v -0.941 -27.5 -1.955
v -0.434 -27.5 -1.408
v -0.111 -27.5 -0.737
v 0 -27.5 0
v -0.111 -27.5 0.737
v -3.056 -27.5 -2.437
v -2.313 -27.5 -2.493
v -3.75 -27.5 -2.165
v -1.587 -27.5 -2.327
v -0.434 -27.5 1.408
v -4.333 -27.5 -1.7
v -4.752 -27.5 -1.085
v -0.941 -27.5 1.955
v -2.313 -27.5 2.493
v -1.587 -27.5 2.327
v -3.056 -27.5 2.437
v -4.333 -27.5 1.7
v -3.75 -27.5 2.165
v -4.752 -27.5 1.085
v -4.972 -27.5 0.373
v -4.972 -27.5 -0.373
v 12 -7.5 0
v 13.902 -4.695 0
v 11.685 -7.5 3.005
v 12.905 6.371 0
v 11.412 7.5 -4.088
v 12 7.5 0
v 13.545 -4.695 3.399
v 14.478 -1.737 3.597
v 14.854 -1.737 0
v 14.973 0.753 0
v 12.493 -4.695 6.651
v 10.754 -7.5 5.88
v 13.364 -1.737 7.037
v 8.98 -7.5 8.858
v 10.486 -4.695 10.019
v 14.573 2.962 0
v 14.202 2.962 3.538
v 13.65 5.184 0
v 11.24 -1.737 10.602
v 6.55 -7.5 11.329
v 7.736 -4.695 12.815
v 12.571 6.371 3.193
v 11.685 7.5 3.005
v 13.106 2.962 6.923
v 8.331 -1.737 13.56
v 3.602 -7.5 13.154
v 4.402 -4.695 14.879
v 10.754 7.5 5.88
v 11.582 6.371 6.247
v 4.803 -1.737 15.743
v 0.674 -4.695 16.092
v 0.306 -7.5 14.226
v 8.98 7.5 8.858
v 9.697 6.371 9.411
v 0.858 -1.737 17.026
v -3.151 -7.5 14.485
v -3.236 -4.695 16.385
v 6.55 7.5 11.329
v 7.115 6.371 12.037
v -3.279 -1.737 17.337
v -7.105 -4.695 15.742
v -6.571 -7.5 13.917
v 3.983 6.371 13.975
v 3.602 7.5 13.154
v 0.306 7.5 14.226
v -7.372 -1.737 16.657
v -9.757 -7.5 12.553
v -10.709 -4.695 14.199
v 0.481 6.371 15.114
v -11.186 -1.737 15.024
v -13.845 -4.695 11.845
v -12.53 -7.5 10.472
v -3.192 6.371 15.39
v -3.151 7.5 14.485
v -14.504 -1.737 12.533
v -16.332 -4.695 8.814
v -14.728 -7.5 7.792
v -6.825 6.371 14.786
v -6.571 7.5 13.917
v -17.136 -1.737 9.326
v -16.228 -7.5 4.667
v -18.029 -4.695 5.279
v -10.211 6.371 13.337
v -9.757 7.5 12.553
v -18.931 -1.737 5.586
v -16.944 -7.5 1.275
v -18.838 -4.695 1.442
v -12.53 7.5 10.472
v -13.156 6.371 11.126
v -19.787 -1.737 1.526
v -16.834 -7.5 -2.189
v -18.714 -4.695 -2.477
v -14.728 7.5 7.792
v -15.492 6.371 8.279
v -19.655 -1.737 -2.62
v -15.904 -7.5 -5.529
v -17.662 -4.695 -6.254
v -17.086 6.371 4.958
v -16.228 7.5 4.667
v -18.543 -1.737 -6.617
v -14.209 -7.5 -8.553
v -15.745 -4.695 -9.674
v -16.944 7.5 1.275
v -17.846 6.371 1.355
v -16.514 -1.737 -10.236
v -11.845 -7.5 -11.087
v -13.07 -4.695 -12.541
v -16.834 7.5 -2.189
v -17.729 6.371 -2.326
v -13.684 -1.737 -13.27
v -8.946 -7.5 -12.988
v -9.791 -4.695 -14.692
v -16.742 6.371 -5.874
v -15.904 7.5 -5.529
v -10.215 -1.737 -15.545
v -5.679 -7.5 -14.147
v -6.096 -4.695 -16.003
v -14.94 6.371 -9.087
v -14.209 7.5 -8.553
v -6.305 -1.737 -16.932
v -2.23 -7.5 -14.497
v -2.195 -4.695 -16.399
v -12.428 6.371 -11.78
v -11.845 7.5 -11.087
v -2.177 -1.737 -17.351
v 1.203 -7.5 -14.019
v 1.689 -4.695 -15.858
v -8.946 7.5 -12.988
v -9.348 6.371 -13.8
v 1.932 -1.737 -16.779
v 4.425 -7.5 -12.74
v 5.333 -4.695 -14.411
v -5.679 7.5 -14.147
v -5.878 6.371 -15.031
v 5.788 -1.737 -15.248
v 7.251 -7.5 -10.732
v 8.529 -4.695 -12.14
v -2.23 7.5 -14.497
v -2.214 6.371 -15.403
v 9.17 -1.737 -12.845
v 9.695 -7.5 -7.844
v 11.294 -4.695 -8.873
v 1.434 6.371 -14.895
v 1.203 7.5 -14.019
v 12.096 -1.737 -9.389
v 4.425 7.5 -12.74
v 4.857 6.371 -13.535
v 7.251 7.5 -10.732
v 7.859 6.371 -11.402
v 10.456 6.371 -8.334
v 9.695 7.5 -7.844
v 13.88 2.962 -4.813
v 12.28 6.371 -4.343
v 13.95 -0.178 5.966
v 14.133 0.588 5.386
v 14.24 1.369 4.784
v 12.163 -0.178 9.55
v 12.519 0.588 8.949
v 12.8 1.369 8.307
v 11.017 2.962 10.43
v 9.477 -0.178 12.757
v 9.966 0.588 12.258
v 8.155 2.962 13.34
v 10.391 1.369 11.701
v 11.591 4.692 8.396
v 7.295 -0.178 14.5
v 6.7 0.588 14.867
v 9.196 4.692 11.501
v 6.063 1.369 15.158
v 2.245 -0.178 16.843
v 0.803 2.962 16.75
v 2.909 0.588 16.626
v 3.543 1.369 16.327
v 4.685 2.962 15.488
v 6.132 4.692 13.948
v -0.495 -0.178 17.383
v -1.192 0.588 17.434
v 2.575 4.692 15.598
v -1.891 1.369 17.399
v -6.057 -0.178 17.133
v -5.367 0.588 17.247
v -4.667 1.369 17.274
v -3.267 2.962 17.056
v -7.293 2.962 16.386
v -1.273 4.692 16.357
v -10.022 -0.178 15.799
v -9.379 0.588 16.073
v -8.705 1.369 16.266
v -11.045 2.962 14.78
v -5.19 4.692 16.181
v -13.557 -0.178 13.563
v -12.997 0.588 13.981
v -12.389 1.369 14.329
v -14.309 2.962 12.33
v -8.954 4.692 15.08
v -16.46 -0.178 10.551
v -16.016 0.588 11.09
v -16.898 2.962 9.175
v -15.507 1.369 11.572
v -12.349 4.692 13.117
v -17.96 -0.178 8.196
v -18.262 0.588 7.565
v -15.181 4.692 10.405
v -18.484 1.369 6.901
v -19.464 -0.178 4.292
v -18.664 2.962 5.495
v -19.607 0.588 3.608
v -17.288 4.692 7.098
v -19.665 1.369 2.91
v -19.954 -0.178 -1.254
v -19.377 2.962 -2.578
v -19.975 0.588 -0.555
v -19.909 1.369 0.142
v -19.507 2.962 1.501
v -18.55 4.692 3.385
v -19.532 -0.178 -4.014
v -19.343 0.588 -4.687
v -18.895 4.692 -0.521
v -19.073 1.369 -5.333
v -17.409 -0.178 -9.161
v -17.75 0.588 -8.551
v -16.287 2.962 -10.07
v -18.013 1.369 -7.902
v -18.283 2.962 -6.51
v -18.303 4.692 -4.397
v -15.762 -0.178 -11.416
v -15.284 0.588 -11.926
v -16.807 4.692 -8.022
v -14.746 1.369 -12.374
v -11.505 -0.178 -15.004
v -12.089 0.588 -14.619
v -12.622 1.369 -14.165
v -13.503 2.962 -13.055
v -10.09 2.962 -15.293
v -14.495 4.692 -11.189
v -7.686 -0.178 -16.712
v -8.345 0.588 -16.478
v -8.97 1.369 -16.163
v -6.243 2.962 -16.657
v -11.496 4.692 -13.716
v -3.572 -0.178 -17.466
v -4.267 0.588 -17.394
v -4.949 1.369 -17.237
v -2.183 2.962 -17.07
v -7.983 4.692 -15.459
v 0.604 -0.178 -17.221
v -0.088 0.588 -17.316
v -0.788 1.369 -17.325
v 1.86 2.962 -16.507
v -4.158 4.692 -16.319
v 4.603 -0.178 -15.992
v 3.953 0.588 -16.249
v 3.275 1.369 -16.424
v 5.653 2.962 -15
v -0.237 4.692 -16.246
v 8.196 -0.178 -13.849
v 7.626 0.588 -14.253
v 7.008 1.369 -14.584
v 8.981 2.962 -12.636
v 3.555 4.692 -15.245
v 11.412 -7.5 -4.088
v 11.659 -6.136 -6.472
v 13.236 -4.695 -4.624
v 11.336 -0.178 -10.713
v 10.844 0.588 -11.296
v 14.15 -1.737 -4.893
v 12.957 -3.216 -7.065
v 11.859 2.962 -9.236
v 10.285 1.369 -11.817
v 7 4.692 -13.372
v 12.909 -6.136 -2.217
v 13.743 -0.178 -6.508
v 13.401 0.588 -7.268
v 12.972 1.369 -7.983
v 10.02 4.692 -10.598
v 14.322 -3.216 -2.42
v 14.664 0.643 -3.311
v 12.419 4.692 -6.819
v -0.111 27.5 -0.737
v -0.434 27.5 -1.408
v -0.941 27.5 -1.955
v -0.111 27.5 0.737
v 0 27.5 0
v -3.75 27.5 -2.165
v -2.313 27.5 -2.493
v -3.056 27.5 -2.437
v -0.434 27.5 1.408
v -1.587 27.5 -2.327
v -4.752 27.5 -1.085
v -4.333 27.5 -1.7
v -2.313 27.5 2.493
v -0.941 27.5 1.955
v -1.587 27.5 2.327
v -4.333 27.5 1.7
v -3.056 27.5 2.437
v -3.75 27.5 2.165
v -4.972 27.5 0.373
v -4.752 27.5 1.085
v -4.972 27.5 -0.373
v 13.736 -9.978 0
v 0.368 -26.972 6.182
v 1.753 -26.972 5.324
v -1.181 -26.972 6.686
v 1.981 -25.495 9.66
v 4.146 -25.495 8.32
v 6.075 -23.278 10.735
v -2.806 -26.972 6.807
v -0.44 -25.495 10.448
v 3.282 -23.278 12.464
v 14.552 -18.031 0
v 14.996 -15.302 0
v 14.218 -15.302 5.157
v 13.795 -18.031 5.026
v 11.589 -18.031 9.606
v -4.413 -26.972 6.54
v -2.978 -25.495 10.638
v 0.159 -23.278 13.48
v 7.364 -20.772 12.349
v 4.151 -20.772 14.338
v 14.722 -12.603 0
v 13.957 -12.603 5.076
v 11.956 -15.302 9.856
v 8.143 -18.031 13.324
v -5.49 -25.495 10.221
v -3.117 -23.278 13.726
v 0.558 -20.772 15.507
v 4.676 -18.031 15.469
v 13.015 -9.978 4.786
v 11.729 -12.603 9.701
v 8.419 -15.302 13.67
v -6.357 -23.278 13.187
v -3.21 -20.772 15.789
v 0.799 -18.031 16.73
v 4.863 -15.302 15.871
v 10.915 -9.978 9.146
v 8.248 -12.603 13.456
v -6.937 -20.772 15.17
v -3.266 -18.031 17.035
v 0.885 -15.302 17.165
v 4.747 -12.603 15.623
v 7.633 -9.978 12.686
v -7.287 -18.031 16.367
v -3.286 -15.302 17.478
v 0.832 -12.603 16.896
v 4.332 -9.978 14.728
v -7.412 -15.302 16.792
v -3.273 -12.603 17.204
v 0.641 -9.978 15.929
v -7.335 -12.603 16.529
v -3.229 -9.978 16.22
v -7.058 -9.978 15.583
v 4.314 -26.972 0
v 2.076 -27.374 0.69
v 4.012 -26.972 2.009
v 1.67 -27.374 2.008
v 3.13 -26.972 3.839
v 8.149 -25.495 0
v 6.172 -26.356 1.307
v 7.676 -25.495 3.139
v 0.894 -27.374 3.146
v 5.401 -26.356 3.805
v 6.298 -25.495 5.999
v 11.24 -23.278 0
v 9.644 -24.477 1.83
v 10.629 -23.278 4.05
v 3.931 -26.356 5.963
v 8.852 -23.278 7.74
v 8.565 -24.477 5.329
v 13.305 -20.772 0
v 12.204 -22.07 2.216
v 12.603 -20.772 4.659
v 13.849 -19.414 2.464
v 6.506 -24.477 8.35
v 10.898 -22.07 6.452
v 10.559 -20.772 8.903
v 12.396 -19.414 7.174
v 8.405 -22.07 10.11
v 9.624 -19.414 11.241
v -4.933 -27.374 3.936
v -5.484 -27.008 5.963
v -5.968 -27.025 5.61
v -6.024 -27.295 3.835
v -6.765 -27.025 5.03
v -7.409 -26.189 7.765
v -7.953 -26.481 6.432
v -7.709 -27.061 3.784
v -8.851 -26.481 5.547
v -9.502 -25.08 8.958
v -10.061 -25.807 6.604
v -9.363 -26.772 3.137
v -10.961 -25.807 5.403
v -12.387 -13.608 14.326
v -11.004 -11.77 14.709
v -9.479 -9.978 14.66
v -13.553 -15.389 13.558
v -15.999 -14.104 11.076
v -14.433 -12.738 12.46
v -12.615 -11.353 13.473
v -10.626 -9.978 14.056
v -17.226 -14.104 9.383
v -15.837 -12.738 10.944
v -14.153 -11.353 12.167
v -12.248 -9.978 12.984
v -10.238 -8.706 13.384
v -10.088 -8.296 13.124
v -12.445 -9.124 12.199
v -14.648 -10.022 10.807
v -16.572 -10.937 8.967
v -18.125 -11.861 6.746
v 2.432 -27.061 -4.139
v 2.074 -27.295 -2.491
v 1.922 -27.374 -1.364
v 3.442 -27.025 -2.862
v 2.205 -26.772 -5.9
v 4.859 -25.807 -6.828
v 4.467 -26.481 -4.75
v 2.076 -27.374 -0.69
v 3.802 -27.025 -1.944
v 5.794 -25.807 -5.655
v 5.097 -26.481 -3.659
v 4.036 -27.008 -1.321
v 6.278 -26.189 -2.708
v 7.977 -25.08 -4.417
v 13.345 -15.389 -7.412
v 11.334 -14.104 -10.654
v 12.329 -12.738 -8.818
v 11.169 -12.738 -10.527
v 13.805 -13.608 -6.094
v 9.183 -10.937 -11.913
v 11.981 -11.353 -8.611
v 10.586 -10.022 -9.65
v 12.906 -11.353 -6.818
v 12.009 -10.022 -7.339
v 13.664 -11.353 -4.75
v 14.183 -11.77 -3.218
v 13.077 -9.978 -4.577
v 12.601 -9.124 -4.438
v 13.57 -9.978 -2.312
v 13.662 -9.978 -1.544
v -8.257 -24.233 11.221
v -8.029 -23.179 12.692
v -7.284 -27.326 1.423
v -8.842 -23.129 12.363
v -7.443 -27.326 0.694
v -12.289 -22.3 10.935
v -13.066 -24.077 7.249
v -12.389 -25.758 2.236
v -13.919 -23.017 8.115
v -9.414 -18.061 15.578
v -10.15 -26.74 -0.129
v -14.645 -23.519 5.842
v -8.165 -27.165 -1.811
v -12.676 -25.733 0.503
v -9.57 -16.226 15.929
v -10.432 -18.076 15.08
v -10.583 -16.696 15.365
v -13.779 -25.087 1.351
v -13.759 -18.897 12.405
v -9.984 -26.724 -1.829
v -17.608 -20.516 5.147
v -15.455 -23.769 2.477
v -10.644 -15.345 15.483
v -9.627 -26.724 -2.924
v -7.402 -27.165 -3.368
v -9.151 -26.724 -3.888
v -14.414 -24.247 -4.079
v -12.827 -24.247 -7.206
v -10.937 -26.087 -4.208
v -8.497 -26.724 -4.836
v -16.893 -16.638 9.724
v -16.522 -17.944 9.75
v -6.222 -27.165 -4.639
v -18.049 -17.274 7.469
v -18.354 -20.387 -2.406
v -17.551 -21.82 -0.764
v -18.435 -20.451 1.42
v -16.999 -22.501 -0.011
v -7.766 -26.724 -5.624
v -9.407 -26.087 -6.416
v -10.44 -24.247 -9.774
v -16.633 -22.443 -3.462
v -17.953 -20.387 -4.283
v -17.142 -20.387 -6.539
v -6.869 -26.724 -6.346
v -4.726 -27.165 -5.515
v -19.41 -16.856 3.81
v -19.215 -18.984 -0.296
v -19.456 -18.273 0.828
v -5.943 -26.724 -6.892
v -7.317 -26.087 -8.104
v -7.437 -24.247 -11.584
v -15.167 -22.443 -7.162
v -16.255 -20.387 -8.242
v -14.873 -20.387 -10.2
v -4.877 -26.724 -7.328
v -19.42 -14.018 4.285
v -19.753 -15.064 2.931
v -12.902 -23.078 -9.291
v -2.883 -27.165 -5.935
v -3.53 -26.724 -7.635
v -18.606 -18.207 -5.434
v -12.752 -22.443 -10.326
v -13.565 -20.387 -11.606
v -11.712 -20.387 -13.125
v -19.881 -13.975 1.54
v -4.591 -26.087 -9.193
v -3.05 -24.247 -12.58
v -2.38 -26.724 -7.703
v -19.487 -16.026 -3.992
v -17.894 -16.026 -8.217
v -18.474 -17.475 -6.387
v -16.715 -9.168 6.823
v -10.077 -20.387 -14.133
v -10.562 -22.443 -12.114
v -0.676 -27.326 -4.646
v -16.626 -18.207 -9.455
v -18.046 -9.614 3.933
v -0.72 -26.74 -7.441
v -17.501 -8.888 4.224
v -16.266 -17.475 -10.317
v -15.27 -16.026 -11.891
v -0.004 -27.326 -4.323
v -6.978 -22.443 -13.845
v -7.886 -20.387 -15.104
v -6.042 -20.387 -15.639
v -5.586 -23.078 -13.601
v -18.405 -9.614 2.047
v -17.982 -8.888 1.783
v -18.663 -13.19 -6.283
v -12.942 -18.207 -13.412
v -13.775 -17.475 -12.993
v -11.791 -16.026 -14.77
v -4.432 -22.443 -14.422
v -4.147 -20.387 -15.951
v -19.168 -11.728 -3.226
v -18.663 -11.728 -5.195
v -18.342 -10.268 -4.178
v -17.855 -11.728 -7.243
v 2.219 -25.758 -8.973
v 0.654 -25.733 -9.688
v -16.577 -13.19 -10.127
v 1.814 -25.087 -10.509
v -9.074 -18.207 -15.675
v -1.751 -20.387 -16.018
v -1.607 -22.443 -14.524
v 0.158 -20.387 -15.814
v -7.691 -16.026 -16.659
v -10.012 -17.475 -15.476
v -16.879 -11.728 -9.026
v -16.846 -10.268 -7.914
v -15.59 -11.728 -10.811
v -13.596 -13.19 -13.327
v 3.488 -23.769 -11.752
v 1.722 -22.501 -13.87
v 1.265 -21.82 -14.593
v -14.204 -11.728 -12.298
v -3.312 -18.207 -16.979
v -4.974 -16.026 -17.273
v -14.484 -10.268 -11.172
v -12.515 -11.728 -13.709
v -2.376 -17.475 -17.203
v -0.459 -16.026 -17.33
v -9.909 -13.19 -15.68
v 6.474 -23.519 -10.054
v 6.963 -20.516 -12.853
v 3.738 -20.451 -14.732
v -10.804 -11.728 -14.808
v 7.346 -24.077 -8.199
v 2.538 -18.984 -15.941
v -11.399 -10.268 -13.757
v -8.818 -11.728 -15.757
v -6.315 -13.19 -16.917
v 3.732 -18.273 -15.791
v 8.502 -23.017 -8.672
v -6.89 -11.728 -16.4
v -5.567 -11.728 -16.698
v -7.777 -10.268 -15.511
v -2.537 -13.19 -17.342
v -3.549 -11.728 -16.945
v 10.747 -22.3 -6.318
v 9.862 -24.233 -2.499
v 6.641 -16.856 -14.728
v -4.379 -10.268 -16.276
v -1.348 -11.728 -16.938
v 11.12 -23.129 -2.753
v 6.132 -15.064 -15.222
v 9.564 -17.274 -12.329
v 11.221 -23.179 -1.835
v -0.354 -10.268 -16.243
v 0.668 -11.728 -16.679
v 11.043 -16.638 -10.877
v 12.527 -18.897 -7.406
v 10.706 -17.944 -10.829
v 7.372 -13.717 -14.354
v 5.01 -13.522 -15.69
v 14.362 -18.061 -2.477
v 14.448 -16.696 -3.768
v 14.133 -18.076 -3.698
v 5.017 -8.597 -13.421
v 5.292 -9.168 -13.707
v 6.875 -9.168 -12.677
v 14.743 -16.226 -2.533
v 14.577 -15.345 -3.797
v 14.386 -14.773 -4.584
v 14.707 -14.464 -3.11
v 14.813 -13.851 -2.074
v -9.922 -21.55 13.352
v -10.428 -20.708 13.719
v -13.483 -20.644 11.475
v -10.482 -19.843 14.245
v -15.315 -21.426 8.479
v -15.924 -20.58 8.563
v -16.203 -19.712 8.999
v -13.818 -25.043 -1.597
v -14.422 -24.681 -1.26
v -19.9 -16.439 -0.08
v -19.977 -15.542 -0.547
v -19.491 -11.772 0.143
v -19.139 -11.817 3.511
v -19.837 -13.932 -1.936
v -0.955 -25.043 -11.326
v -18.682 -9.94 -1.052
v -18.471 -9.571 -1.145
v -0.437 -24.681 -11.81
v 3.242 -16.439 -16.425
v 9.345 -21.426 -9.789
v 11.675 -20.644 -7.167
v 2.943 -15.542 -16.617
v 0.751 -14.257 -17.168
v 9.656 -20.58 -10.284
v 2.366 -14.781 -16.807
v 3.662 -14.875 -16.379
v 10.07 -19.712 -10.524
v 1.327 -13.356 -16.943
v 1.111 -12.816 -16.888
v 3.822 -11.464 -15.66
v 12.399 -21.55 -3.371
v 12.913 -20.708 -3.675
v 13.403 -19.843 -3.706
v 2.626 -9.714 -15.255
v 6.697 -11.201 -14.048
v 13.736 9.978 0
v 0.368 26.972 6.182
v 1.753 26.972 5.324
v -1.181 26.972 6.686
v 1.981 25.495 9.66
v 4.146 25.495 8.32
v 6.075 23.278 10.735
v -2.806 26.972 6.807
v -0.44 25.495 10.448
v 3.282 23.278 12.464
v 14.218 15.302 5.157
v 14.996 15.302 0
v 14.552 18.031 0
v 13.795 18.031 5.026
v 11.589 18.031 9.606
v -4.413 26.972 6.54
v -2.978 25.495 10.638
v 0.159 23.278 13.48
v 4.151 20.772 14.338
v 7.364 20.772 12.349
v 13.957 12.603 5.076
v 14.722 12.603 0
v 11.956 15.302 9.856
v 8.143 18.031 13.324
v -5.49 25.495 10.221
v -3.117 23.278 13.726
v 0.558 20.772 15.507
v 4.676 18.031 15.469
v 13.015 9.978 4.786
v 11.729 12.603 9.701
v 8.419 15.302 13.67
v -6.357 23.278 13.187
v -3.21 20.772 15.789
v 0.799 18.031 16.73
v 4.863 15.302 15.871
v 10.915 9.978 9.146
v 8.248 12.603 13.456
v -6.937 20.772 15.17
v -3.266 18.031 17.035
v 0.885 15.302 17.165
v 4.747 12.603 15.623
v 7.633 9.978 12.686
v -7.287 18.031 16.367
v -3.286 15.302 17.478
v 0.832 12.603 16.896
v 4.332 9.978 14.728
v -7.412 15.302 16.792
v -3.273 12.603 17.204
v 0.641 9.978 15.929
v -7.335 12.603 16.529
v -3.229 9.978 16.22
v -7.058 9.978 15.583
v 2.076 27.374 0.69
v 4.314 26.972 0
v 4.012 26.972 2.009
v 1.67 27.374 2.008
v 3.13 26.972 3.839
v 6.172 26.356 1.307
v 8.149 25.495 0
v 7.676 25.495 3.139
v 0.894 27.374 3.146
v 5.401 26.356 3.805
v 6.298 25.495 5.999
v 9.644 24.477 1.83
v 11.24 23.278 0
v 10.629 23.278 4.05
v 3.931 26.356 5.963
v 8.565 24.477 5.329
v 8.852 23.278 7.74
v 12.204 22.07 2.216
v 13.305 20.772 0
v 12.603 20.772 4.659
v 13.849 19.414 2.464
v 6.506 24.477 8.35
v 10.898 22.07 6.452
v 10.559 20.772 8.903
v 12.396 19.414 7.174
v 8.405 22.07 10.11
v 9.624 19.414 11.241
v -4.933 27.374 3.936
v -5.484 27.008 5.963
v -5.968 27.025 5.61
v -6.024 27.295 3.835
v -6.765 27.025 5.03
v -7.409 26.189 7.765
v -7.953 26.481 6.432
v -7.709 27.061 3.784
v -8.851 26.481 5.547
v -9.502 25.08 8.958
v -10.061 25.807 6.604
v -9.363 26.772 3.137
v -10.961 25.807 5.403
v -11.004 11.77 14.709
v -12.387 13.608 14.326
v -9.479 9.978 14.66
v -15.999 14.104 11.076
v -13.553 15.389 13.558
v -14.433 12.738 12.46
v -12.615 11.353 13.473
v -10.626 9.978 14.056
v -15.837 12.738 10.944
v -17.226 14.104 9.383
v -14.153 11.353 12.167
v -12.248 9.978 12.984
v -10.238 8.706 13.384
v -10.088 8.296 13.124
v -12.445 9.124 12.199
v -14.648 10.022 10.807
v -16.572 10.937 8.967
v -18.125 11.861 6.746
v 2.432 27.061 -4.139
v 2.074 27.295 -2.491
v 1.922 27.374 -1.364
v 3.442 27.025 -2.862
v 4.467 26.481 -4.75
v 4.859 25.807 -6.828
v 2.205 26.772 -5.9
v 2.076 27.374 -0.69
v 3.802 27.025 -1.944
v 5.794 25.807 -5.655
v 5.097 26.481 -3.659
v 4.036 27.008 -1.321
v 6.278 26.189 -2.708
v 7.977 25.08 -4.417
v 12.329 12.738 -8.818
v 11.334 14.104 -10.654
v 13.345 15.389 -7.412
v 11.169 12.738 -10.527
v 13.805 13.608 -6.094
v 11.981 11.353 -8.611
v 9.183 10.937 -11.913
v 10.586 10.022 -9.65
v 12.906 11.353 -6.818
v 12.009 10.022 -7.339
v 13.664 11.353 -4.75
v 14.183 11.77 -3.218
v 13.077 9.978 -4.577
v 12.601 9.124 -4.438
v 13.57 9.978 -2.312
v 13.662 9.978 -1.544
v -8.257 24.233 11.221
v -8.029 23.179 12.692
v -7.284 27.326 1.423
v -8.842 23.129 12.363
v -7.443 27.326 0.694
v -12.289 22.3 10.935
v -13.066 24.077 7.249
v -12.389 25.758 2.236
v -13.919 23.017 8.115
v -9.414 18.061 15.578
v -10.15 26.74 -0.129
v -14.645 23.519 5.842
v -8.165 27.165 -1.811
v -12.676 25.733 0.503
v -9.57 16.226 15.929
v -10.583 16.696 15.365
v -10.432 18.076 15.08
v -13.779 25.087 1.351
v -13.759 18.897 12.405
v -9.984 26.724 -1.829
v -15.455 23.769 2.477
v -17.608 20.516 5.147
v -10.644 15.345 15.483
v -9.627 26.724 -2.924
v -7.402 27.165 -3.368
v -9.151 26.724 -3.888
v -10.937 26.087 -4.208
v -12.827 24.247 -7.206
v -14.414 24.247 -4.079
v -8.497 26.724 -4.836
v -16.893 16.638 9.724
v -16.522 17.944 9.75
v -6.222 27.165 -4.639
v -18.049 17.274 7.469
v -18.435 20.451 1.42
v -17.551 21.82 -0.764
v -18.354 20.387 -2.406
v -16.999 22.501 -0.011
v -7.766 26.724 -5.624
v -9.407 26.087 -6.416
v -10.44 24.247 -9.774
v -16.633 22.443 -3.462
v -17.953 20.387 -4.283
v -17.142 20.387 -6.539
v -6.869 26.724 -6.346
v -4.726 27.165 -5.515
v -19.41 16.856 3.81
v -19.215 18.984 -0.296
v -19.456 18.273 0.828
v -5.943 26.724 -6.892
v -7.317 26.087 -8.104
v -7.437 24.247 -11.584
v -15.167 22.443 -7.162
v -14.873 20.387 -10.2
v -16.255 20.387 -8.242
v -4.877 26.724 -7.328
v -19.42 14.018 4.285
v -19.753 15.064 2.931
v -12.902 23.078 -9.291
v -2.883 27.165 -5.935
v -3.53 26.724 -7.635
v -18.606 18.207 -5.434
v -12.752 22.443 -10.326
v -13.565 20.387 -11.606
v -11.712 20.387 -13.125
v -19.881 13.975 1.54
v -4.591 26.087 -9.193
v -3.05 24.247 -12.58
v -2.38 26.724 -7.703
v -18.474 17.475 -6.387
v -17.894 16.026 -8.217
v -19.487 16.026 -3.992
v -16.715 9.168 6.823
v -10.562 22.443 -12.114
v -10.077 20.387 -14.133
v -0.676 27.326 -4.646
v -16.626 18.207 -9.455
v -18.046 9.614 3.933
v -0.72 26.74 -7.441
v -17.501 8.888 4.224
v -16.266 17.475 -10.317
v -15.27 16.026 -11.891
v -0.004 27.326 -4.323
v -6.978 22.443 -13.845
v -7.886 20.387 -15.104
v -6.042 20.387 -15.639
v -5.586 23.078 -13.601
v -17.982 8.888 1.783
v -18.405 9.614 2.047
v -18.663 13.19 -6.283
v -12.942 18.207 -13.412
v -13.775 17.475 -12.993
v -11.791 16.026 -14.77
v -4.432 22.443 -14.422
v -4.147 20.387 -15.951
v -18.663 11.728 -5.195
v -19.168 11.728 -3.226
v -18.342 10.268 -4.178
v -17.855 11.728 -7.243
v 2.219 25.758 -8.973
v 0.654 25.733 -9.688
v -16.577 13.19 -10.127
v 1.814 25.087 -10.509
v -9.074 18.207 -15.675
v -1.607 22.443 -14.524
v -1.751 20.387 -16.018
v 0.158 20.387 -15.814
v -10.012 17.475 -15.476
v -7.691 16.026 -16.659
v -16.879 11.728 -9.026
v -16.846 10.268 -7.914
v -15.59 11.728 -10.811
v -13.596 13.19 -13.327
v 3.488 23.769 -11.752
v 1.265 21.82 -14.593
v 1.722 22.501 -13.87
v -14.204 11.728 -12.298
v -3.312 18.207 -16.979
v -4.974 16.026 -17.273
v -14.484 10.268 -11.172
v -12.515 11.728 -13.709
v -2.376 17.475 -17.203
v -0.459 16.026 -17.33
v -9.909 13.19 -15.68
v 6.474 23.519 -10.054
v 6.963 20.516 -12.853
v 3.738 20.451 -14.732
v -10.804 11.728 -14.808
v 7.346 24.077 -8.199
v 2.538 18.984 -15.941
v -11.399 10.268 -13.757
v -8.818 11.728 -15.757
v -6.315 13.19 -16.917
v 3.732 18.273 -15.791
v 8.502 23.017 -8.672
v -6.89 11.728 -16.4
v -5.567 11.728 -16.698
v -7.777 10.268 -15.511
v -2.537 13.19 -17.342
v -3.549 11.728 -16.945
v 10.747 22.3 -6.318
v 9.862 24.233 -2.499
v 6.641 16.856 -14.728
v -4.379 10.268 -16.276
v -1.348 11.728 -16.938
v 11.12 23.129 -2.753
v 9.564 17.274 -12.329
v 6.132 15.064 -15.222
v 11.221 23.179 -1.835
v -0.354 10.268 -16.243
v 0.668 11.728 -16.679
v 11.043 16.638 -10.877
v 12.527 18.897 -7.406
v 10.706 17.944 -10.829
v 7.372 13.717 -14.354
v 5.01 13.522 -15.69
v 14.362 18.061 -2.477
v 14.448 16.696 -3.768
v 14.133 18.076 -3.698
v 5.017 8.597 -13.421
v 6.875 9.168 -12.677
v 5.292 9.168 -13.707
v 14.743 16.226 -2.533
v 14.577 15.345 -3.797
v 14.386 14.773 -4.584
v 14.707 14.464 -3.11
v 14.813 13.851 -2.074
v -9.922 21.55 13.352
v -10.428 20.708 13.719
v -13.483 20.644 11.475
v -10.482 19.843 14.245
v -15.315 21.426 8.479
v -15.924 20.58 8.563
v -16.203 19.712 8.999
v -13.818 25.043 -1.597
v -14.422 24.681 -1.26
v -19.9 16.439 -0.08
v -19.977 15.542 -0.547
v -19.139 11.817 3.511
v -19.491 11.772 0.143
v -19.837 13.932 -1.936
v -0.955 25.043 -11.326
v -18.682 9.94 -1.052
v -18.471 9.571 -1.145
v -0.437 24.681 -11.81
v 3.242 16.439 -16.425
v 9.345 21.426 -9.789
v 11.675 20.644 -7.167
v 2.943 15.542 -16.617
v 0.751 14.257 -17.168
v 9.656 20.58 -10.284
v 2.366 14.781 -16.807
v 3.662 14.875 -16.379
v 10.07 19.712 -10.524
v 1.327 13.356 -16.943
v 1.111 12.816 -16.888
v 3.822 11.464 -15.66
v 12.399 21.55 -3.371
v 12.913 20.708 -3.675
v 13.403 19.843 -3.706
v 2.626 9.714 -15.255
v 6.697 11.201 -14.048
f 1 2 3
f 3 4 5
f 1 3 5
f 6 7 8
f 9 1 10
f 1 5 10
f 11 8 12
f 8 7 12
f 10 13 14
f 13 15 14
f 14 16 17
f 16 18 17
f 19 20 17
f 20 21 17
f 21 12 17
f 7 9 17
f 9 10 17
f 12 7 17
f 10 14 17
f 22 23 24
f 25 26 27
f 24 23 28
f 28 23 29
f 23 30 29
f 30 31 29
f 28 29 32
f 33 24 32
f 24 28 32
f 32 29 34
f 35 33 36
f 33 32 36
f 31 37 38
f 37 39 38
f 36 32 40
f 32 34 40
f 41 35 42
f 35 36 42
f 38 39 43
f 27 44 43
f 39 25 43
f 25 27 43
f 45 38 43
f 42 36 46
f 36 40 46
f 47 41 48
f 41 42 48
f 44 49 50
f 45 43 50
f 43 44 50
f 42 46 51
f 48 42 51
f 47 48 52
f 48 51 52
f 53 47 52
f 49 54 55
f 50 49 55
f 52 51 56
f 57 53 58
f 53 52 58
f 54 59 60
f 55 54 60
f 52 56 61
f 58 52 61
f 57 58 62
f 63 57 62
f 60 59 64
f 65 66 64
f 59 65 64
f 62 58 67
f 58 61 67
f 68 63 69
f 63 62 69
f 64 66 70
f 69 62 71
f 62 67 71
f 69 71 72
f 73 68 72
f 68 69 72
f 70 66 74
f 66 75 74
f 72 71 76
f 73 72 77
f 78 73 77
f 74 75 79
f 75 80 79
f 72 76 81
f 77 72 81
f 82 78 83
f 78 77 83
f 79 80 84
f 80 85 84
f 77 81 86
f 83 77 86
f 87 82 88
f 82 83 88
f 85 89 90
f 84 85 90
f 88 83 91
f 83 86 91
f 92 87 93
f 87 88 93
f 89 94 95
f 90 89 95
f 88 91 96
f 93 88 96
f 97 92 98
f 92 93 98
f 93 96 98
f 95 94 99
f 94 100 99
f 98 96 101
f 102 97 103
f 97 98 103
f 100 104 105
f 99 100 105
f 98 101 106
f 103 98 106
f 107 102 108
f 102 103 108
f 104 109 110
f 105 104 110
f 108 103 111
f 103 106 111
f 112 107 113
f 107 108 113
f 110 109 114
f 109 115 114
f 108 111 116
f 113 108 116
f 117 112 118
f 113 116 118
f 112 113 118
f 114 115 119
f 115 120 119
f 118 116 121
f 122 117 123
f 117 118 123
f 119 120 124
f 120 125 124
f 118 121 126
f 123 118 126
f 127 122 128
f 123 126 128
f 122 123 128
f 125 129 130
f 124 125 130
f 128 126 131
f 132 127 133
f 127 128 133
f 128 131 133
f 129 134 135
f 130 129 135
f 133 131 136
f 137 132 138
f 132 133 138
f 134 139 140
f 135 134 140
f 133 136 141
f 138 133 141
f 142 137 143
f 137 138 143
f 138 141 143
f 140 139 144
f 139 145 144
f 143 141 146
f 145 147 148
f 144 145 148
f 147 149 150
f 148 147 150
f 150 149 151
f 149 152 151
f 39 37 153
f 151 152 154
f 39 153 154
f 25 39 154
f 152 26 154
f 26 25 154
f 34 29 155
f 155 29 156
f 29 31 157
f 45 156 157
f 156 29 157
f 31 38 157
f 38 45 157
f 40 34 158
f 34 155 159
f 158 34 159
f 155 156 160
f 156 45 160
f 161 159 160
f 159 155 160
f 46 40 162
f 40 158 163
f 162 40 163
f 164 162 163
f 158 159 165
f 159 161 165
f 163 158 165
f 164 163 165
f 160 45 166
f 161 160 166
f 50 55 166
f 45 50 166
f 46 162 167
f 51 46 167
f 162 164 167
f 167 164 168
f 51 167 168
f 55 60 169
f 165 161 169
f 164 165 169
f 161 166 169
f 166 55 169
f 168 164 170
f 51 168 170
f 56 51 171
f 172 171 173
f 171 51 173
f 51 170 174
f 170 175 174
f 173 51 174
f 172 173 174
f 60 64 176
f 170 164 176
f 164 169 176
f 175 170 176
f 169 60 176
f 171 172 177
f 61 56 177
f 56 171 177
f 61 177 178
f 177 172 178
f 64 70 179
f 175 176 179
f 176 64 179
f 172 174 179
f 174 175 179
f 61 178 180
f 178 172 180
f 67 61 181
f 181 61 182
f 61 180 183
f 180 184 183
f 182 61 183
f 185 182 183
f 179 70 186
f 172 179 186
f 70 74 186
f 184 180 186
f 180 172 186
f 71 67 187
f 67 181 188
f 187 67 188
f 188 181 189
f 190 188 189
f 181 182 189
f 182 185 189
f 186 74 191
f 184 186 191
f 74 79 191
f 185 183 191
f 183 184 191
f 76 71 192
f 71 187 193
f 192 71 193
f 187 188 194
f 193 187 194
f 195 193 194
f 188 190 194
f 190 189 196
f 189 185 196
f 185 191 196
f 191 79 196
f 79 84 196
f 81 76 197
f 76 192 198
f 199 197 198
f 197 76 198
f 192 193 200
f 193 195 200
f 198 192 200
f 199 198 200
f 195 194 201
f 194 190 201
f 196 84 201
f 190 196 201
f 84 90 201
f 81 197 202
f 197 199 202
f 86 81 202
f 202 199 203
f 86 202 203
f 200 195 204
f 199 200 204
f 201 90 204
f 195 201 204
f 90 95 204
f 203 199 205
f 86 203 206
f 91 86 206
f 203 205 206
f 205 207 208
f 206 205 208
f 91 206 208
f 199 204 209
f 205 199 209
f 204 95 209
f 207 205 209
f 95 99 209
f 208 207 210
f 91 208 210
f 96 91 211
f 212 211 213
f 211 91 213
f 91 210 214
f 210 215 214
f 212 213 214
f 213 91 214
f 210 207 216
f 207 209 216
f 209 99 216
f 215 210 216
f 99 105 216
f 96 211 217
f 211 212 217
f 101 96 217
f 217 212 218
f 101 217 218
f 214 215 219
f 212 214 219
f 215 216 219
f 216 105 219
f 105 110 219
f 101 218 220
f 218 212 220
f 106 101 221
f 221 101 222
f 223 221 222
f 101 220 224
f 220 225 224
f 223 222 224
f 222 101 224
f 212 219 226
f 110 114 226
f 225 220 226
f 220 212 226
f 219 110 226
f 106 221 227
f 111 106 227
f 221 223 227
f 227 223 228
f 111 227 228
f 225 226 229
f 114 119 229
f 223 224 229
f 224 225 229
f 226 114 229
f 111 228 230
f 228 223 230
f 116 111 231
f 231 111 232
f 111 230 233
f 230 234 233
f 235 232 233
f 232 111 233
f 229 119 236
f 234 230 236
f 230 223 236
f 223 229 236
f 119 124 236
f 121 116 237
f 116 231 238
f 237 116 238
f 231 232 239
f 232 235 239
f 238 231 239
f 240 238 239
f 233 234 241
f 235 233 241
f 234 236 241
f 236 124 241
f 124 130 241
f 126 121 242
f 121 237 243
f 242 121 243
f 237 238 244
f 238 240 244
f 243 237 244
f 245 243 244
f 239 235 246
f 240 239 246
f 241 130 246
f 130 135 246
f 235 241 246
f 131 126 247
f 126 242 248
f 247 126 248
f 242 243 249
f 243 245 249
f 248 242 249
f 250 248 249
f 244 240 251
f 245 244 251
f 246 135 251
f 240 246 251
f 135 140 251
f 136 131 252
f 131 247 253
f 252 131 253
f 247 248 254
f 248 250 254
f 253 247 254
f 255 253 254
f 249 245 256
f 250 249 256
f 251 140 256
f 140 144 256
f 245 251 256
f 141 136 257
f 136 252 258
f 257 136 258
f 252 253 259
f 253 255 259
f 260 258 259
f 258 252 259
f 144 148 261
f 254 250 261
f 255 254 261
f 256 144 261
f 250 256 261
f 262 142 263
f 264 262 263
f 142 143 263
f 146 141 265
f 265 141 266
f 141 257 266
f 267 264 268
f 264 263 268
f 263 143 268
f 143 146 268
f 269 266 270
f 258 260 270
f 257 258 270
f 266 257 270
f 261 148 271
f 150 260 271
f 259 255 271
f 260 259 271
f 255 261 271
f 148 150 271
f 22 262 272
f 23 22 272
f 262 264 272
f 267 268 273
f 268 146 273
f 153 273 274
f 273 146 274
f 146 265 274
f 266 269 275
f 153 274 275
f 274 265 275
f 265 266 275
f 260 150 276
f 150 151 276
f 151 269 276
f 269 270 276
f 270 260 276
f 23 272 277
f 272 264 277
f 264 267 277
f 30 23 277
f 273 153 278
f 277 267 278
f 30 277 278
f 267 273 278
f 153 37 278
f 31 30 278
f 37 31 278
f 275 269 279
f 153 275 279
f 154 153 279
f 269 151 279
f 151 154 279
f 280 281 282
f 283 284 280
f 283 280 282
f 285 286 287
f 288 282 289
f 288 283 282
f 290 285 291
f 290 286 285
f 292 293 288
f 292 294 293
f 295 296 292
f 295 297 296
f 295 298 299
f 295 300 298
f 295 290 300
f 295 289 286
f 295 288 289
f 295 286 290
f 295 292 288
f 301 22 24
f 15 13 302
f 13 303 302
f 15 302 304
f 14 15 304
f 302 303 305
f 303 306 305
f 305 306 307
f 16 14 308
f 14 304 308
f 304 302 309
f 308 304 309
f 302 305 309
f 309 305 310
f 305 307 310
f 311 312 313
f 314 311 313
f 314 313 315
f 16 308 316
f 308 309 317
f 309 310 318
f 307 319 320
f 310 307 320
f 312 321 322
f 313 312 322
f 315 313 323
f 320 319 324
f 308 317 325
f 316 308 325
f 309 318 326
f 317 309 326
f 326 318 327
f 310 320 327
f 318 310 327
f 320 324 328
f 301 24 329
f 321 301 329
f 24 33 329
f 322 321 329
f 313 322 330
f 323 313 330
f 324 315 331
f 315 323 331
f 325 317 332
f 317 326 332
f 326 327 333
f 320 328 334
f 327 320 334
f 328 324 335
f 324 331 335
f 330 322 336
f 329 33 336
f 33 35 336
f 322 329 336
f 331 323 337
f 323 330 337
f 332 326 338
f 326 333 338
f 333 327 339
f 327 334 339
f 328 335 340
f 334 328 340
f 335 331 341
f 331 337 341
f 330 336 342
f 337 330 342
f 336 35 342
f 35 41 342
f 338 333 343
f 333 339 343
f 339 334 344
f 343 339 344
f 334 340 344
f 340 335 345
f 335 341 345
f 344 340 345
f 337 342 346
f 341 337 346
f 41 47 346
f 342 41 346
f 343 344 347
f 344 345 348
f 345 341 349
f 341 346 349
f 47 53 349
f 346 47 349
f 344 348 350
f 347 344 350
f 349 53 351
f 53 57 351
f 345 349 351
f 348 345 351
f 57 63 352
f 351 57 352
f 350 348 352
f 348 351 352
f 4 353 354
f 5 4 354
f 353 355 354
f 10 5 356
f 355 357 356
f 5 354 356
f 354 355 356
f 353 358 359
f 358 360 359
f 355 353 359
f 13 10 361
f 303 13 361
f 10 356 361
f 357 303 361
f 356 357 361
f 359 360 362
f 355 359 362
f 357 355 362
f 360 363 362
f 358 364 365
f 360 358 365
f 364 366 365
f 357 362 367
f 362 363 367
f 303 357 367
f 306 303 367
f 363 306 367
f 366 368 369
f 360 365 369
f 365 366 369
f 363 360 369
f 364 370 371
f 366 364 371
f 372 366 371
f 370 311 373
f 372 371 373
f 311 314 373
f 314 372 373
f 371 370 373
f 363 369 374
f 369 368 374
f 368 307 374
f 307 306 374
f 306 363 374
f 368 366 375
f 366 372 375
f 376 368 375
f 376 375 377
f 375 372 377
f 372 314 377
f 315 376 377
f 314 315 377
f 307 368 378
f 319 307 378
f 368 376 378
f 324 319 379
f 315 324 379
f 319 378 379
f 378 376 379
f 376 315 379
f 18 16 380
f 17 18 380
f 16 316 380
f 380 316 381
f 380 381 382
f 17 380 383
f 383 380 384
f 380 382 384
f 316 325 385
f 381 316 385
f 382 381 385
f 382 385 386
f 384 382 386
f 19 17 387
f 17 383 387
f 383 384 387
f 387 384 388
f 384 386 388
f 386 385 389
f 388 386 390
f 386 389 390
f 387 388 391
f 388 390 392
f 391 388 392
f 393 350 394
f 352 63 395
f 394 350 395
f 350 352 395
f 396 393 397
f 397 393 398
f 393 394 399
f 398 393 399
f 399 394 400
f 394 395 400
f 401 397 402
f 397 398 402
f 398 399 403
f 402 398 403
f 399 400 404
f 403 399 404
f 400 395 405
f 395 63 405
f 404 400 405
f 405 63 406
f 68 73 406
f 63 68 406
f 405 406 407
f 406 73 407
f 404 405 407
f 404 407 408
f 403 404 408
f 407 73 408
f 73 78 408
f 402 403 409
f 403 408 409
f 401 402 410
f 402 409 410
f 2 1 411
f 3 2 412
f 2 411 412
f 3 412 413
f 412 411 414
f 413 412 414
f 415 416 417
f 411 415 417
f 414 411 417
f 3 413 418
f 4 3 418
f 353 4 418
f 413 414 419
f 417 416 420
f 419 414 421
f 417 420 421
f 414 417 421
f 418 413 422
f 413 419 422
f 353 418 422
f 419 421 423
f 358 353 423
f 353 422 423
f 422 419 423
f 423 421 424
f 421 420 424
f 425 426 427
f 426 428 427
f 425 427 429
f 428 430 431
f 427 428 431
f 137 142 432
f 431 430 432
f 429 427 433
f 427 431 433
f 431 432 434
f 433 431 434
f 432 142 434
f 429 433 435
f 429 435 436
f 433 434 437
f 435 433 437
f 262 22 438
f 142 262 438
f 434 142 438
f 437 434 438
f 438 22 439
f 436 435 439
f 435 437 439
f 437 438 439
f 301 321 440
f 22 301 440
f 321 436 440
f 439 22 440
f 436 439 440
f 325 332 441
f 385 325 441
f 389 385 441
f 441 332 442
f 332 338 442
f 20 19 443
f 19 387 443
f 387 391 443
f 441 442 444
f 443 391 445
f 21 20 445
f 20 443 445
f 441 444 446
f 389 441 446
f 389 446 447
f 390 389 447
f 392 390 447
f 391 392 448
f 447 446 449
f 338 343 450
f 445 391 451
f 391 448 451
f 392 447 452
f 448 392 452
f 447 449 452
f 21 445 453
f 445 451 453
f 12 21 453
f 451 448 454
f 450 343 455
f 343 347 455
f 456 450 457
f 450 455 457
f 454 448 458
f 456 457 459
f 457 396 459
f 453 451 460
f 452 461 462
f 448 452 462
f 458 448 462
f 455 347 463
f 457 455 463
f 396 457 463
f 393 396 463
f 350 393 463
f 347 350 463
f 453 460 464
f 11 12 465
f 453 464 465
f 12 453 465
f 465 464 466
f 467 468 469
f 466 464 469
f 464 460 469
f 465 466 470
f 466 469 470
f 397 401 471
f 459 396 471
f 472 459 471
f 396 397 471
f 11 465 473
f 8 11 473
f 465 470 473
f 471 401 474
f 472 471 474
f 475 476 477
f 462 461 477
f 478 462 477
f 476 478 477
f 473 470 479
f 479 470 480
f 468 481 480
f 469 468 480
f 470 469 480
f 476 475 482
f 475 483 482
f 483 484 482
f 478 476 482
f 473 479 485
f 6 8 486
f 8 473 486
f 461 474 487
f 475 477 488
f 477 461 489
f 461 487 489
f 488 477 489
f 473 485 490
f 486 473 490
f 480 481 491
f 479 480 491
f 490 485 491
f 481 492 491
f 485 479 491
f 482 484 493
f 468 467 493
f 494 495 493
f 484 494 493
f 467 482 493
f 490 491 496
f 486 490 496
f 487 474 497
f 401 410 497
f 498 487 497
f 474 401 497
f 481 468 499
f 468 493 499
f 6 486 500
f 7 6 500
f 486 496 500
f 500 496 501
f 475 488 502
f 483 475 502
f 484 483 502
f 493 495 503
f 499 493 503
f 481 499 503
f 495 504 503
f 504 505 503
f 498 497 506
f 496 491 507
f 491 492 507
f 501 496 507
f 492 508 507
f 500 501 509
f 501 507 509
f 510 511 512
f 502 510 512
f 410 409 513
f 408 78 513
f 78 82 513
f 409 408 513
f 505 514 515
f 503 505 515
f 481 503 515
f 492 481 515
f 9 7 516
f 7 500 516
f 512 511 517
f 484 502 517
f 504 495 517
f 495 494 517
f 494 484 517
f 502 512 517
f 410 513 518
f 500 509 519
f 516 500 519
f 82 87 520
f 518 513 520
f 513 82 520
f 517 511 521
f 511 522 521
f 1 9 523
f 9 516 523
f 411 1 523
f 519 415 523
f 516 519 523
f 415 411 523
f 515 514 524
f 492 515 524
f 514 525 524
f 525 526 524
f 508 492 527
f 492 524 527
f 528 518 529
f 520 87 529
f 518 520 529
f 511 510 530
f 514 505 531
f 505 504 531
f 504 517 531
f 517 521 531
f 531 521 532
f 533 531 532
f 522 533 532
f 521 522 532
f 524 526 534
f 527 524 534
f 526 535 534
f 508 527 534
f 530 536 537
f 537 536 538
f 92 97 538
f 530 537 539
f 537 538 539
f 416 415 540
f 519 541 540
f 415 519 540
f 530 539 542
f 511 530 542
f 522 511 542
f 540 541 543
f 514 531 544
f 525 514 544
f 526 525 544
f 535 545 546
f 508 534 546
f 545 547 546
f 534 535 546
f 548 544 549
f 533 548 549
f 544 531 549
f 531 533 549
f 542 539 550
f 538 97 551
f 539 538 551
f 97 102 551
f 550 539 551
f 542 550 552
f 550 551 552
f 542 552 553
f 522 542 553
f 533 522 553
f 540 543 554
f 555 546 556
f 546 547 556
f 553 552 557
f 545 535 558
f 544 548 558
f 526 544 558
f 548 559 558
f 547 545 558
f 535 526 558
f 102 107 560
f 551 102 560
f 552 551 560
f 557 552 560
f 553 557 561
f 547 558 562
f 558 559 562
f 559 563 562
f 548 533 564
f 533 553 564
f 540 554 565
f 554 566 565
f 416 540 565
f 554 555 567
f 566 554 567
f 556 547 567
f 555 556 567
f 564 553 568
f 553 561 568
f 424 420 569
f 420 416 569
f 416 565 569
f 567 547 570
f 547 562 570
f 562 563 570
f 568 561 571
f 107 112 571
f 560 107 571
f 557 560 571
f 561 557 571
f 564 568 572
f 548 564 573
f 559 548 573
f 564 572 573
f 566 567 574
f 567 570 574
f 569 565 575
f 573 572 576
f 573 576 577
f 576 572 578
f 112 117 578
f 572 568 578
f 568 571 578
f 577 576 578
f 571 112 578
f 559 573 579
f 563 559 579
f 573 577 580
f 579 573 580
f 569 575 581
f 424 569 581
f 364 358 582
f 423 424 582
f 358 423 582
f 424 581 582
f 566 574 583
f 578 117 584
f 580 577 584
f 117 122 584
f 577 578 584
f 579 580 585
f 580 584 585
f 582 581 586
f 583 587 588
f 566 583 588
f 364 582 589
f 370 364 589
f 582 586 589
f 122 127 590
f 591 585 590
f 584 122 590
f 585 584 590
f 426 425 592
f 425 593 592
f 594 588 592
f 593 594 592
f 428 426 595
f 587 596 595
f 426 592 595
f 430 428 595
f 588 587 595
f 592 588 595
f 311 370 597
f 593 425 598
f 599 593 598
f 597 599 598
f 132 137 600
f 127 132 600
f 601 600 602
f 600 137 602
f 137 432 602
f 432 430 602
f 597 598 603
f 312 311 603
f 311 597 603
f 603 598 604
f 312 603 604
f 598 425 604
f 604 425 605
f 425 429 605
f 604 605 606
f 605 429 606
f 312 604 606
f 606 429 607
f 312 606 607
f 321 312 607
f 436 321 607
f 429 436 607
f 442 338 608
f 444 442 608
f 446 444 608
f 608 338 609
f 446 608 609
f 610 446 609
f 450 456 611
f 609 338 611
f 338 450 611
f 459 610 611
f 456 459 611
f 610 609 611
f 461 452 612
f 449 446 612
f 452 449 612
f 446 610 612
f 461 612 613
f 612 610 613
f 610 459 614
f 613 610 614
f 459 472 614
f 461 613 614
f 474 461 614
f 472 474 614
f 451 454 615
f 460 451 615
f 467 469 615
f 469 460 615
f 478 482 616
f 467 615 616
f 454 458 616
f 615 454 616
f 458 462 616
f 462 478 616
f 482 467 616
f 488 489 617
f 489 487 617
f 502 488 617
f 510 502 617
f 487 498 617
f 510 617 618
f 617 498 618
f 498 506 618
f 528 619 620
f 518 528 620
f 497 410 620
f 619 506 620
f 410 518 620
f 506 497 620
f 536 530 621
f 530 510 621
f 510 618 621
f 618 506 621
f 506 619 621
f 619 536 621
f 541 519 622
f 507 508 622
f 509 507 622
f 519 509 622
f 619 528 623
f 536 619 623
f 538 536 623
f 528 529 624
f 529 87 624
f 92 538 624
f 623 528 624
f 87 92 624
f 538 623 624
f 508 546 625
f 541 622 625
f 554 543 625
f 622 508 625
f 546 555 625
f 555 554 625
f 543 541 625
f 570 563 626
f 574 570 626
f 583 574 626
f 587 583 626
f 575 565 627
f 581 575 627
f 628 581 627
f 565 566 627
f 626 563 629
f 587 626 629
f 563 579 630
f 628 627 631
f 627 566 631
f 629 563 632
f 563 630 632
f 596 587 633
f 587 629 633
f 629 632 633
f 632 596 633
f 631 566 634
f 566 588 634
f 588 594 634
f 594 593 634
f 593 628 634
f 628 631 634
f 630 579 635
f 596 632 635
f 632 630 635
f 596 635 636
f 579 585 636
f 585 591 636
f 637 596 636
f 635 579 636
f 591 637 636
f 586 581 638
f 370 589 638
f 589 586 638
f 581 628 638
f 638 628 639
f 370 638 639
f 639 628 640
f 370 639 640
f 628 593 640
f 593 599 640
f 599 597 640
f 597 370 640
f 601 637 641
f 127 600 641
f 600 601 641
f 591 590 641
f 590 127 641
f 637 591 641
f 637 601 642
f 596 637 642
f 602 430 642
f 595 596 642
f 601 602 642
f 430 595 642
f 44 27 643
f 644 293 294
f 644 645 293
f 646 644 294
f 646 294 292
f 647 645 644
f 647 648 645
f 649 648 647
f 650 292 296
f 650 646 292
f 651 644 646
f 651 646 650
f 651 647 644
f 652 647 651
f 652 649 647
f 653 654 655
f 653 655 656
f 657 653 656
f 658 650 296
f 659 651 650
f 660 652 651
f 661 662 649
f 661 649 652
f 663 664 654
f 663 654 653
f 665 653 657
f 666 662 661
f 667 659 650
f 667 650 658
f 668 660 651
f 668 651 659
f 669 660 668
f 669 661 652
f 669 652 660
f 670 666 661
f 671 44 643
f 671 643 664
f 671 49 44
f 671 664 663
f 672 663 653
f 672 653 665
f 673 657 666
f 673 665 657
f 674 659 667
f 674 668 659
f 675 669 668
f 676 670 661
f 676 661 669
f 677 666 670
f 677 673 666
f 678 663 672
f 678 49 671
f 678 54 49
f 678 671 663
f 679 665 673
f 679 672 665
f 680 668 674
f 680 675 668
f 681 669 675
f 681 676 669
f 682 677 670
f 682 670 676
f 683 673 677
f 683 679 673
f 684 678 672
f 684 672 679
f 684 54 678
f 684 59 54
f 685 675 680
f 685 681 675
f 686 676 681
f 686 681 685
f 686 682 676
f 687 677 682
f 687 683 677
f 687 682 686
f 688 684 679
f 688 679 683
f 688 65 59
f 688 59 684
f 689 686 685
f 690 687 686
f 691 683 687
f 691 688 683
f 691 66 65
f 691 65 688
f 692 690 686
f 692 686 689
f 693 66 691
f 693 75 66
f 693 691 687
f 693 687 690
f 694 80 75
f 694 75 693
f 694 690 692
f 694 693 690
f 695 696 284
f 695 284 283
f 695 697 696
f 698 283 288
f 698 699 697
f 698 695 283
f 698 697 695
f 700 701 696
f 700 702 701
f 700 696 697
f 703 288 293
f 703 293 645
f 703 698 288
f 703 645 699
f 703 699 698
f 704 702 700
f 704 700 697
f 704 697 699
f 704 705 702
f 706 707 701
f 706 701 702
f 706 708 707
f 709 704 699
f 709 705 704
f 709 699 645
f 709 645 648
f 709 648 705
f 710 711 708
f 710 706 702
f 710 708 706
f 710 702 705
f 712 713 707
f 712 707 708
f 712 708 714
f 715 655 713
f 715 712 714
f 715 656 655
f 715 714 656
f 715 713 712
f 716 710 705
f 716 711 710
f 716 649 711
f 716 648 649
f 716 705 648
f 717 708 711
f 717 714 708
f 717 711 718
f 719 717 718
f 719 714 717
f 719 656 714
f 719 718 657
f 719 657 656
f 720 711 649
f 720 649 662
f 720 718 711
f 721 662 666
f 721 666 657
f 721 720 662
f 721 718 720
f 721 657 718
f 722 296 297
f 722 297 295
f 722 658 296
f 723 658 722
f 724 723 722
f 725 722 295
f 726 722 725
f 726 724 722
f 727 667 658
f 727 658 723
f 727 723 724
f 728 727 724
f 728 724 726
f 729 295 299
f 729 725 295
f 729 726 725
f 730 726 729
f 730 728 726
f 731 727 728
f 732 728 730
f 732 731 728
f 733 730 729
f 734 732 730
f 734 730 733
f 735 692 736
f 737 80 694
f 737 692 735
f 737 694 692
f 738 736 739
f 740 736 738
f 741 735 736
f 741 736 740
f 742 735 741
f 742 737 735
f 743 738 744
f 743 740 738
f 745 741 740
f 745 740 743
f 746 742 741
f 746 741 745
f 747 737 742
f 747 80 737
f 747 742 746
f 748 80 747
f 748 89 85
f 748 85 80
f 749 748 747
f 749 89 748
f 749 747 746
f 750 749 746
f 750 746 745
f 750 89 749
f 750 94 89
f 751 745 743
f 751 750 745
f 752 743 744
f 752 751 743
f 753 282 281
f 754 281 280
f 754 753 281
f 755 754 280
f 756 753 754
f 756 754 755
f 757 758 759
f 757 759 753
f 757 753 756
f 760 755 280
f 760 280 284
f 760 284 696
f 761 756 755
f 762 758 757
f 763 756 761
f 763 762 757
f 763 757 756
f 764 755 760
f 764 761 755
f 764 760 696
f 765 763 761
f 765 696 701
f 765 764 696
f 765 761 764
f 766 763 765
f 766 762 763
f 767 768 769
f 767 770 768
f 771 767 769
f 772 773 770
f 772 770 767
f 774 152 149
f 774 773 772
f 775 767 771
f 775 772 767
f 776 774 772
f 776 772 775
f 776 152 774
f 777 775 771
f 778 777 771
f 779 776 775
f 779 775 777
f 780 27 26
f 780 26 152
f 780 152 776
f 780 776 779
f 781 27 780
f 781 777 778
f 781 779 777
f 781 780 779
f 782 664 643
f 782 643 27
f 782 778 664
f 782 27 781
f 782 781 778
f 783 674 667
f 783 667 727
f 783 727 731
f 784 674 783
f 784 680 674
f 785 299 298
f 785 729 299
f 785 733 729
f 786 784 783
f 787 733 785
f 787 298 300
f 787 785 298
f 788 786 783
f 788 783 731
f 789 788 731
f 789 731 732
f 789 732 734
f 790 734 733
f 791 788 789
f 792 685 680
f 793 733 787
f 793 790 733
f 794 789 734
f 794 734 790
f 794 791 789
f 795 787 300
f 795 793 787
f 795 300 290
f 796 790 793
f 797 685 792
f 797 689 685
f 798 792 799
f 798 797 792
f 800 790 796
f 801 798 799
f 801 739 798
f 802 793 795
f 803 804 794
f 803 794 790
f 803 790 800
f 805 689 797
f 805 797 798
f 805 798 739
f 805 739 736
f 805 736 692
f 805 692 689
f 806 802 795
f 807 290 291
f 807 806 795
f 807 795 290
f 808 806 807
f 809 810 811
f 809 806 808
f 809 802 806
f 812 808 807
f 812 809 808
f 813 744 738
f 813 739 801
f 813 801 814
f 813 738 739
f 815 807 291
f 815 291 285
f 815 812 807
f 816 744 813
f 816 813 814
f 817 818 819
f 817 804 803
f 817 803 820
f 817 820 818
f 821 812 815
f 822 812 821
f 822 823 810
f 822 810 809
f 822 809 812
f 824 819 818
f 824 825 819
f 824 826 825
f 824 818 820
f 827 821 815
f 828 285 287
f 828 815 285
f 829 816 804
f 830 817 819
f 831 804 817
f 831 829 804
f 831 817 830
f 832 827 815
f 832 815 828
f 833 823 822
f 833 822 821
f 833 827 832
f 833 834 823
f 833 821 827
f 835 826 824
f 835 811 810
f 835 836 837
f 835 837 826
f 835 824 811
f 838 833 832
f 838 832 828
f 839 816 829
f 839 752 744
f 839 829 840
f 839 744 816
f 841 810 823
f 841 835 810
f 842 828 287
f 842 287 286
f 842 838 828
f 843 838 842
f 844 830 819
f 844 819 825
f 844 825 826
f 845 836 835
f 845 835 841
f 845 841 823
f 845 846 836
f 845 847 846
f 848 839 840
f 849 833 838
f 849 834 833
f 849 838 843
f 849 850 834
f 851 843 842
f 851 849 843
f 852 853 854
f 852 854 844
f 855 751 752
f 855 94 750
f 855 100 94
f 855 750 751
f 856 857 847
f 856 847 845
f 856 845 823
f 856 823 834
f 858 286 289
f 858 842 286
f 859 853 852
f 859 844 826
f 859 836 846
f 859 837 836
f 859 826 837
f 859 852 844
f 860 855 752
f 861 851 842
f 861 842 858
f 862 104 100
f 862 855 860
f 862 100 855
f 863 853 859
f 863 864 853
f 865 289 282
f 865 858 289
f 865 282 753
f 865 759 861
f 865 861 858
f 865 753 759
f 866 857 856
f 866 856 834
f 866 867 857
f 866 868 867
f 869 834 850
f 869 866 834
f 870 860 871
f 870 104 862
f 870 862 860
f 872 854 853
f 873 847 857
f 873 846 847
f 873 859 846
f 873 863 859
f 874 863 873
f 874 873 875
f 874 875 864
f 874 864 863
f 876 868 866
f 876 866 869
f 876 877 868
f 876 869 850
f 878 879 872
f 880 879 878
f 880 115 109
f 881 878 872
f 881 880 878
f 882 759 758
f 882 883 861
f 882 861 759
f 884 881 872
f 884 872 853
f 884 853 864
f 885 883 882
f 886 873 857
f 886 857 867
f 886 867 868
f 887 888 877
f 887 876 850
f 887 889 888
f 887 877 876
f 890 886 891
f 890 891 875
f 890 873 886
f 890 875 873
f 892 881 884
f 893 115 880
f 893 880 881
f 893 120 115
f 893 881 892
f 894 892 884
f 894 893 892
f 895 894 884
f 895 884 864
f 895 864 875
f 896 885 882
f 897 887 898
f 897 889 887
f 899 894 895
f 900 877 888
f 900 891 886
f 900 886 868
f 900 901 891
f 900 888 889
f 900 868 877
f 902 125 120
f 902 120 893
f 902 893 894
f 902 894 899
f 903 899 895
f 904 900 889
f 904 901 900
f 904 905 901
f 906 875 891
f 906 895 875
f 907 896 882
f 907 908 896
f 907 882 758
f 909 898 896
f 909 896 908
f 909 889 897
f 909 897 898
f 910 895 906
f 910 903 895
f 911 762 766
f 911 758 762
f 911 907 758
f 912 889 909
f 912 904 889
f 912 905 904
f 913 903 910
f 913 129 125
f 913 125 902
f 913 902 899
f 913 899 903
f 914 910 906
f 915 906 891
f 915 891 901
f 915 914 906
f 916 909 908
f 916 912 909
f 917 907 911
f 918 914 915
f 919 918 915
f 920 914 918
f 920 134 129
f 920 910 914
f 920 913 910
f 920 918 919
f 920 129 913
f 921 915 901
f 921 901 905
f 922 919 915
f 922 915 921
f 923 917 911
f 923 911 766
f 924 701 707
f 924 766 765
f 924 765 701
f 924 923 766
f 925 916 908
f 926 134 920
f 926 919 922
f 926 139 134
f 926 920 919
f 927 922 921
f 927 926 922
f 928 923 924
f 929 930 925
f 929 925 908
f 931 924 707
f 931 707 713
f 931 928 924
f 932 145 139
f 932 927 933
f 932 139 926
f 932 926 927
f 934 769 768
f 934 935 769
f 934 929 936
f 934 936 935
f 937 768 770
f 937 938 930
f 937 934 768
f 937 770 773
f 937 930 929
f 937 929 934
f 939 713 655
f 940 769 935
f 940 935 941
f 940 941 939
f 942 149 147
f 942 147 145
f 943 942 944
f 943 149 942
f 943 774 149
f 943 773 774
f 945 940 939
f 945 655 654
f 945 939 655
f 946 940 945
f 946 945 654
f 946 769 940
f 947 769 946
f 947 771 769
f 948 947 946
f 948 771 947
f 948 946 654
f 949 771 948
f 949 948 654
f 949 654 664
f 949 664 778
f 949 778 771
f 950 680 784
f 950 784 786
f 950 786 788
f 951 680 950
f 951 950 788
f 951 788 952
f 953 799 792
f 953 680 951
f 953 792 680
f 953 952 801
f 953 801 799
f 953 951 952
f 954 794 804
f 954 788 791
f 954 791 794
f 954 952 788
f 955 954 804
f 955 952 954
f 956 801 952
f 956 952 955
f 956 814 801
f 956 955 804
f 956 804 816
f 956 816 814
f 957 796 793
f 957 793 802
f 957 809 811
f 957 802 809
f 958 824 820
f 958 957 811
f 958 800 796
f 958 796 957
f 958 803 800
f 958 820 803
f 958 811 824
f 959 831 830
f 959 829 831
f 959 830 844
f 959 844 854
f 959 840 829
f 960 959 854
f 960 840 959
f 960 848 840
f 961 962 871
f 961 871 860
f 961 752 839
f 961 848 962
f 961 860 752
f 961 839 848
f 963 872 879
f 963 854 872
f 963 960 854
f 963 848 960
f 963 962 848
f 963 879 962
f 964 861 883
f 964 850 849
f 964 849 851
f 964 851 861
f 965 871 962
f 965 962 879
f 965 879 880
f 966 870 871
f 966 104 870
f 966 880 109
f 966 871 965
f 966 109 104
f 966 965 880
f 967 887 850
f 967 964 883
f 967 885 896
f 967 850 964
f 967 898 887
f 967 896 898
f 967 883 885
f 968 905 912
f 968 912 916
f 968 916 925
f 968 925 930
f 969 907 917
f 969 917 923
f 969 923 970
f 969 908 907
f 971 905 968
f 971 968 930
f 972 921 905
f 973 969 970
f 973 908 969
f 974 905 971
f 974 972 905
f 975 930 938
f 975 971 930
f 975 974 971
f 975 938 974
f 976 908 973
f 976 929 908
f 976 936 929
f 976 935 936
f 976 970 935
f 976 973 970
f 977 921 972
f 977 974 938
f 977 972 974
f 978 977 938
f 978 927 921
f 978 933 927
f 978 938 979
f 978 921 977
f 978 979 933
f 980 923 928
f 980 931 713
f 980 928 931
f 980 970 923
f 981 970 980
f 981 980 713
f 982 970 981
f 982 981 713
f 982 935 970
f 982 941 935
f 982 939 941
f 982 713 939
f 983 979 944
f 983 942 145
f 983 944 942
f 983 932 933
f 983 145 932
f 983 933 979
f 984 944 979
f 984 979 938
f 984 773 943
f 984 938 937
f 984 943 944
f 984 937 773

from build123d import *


with BuildPart() as f1:
    # F0 (on Top) → F1 (revolve)
    with BuildSketch(Plane.XY):
        with BuildLine():
            Line((-2.5, -12.5), (0, -12.5))
            add(Edge.make_bspline(
                [(0, -12.5), (15, -12.5), (15, 0), (15, 12.5), (0, 12.5)],
                knots=[1.5707963268, 1.5707963268, 1.5707963268, 3.1415926536, 3.1415926536, 4.7123889804, 4.7123889804, 4.7123889804], degree=2, weights=[1, 0.7071067812, 1, 0.7071067812, 1]))
            Line((0, 12.5), (-2.5, 12.5))
            Line((-2.5, 12.5), (-2.5, -12.5))
        make_face()
    revolve(axis=Axis((-2.5, 0, 0), (0, -1, 0)))

    # F3: F1 across plane


with BuildPart() as f1_1:
    add(f1.part)
    add(f1.part.mirror(Plane.XZ.offset(-7.5)))

    # F4: F1 across plane


with BuildPart() as f1_2:
    add(f1_1.part)
    add(f1_1.part.mirror(Plane.XZ))


solid = f1_2.part
